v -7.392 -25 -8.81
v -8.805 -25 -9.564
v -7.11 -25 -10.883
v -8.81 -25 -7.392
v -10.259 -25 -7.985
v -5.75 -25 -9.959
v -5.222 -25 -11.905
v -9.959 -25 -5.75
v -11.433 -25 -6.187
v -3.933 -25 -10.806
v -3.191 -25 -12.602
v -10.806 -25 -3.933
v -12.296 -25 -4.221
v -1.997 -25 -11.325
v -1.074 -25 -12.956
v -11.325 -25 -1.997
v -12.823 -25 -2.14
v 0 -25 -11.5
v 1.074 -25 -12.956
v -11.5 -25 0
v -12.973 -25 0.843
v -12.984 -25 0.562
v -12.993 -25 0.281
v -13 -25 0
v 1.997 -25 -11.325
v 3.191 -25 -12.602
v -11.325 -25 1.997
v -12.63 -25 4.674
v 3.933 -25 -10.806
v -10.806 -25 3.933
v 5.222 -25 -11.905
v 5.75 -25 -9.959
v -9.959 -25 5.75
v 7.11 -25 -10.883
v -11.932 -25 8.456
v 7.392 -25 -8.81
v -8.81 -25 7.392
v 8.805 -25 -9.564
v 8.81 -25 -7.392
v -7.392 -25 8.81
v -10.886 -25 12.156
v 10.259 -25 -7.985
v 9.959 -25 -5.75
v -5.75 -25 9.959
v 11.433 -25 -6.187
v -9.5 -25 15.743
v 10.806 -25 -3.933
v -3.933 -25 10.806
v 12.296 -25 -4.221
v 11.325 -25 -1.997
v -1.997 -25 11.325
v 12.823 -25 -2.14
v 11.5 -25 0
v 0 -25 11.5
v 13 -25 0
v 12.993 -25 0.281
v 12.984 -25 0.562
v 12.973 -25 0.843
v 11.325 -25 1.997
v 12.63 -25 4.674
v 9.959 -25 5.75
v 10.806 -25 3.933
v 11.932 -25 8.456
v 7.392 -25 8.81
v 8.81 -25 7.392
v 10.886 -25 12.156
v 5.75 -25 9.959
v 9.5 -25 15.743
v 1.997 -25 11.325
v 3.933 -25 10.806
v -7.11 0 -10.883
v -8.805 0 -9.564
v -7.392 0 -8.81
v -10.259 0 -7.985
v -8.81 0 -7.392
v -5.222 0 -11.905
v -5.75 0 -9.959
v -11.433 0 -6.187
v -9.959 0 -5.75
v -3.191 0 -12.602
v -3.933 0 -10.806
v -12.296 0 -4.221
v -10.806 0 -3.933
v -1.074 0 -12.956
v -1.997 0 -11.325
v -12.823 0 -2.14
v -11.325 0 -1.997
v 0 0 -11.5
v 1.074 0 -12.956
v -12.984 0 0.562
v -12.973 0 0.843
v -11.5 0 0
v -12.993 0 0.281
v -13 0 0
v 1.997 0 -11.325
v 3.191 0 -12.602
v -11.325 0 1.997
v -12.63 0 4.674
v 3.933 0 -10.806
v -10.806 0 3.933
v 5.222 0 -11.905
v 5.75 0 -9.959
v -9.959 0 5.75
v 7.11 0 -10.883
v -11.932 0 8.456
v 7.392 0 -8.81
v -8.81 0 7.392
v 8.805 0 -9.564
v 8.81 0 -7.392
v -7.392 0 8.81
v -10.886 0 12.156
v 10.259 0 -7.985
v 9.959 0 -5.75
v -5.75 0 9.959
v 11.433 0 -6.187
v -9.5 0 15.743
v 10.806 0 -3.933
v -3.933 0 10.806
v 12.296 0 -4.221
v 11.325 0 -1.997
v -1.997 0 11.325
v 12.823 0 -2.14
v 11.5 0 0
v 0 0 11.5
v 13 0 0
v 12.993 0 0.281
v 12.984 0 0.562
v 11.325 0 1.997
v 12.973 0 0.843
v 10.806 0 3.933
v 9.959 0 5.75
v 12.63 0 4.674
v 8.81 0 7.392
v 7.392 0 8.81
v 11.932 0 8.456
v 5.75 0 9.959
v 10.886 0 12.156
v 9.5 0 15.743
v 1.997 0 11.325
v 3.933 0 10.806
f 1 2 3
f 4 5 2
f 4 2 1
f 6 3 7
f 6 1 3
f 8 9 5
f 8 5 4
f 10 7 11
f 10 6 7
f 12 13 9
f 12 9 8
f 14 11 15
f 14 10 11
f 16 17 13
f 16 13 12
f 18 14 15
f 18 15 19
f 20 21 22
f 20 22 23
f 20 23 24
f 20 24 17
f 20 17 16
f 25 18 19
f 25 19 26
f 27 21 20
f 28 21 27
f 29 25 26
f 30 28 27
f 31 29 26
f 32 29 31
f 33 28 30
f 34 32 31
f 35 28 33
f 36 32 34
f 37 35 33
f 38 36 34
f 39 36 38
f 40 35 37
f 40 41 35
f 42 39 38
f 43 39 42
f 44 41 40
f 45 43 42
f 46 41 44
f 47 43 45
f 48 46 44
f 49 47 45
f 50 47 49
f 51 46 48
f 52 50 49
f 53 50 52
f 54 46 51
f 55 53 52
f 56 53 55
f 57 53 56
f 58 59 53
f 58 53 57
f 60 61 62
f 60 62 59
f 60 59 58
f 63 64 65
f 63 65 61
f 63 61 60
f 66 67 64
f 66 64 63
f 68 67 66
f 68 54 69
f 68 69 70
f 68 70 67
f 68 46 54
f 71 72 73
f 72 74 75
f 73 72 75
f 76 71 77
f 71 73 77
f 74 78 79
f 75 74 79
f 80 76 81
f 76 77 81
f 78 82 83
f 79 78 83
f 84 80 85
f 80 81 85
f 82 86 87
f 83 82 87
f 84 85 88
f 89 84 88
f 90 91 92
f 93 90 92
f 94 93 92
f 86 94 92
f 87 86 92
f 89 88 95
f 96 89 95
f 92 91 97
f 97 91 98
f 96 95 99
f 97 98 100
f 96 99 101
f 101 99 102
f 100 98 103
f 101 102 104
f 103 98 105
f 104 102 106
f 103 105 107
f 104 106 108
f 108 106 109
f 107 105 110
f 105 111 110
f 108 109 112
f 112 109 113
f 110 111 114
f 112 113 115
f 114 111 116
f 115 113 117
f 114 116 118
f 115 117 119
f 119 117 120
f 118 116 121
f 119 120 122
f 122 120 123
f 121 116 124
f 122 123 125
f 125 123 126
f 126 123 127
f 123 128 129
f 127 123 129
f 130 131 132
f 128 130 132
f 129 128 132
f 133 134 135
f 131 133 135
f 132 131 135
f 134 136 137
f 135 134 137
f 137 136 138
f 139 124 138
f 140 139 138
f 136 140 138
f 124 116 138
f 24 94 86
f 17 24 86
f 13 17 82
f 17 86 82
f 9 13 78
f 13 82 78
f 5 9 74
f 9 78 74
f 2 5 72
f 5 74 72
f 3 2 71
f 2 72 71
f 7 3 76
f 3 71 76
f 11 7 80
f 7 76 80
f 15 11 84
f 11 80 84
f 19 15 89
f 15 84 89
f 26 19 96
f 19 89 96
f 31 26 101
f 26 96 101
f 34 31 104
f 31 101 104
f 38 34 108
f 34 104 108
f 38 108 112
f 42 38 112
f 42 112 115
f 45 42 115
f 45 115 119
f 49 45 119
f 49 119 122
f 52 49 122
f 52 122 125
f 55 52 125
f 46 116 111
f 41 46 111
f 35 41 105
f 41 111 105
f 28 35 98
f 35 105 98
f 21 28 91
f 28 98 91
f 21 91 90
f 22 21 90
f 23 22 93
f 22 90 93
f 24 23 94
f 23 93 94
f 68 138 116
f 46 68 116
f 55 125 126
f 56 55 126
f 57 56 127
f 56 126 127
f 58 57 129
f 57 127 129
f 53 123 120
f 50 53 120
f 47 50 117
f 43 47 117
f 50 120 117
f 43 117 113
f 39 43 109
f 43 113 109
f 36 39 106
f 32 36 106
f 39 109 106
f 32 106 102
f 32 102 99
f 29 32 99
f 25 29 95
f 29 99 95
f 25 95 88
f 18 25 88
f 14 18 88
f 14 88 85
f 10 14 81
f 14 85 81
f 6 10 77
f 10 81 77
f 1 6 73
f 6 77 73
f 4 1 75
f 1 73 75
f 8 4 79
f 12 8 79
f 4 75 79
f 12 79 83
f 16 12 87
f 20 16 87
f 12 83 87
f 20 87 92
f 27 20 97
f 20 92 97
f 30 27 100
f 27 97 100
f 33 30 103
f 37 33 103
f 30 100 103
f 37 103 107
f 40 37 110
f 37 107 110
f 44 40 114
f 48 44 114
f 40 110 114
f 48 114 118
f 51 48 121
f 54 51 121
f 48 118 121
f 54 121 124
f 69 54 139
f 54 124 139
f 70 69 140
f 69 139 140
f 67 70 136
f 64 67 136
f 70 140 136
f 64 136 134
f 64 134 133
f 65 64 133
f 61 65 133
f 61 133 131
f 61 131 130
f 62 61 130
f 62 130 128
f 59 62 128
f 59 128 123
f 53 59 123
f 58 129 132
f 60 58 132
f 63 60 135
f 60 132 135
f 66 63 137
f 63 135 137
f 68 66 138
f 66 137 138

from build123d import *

# Parameters (mm, degrees)
F1_DEPTH = 25


with BuildPart() as f1:
    # F0 (on Front) → F1 (new body)
    with BuildSketch(Plane.XZ):
        with BuildLine():
            ThreePointArc((9.5, 6.4807406984), (10.9886304879, 3.3911649916), (11.5, 0))
            ThreePointArc((11.5, 0), (-3.3911649916, -10.9886304879), (-9.5, 6.4807406984))
            Line((-9.5, 6.4807406984), (-9.5, 8.8741196746))
            ThreePointArc((-9.5, 8.8741196746), (-11.932192643, 5.1597266138), (-12.9726060851, 0.8434994728))
            ThreePointArc((-12.9726060851, 0.8434994728), (-12.9884576775, 0.4218197114), (-13, 0))
            ThreePointArc((-13, 0), (0, -13), (13, 0))
            ThreePointArc((13, 0), (12.9884576775, 0.4218197114), (12.9726060851, 0.8434994728))
            ThreePointArc((12.9726060851, 0.8434994728), (11.932192643, 5.1597266138), (9.5, 8.8741196746))
            Line((9.5, 8.8741196746), (9.5, 6.4807406984))
        make_face()
        with BuildLine():
            ThreePointArc((-9.5, 6.4807406984), (0, 11.5), (9.5, 6.4807406984))
            Line((9.5, 6.4807406984), (9.5, 8.8741196746))
            ThreePointArc((9.5, 8.8741196746), (0, 13), (-9.5, 8.8741196746))
            Line((-9.5, 8.8741196746), (-9.5, 6.4807406984))
        make_face()
        with BuildLine():
            Line((9.5, 15.7431904227), (9.5, 8.8741196746))
            ThreePointArc((9.5, 8.8741196746), (11.932192643, 5.1597266138), (12.9726060851, 0.8434994728))
            ThreePointArc((12.9726060851, 0.8434994728), (11.932253156, 8.45554701), (9.5, 15.7431904227))
        make_face()
        with BuildLine():
            ThreePointArc((-9.5, 8.8741196746), (0, 13), (9.5, 8.8741196746))
            Line((9.5, 8.8741196746), (9.5, 15.7431904227))
            Line((9.5, 15.7431904227), (-9.5, 15.7431904227))
            Line((-9.5, 15.7431904227), (-9.5, 8.8741196746))
        make_face()
        with BuildLine():
            ThreePointArc((-12.9726060851, 0.8434994728), (-11.932192643, 5.1597266138), (-9.5, 8.8741196746))
            Line((-9.5, 8.8741196746), (-9.5, 15.7431904227))
            ThreePointArc((-9.5, 15.7431904227), (-11.932253156, 8.45554701), (-12.9726060851, 0.8434994728))
        make_face()
    extrude(amount=F1_DEPTH)


solid = f1.part
